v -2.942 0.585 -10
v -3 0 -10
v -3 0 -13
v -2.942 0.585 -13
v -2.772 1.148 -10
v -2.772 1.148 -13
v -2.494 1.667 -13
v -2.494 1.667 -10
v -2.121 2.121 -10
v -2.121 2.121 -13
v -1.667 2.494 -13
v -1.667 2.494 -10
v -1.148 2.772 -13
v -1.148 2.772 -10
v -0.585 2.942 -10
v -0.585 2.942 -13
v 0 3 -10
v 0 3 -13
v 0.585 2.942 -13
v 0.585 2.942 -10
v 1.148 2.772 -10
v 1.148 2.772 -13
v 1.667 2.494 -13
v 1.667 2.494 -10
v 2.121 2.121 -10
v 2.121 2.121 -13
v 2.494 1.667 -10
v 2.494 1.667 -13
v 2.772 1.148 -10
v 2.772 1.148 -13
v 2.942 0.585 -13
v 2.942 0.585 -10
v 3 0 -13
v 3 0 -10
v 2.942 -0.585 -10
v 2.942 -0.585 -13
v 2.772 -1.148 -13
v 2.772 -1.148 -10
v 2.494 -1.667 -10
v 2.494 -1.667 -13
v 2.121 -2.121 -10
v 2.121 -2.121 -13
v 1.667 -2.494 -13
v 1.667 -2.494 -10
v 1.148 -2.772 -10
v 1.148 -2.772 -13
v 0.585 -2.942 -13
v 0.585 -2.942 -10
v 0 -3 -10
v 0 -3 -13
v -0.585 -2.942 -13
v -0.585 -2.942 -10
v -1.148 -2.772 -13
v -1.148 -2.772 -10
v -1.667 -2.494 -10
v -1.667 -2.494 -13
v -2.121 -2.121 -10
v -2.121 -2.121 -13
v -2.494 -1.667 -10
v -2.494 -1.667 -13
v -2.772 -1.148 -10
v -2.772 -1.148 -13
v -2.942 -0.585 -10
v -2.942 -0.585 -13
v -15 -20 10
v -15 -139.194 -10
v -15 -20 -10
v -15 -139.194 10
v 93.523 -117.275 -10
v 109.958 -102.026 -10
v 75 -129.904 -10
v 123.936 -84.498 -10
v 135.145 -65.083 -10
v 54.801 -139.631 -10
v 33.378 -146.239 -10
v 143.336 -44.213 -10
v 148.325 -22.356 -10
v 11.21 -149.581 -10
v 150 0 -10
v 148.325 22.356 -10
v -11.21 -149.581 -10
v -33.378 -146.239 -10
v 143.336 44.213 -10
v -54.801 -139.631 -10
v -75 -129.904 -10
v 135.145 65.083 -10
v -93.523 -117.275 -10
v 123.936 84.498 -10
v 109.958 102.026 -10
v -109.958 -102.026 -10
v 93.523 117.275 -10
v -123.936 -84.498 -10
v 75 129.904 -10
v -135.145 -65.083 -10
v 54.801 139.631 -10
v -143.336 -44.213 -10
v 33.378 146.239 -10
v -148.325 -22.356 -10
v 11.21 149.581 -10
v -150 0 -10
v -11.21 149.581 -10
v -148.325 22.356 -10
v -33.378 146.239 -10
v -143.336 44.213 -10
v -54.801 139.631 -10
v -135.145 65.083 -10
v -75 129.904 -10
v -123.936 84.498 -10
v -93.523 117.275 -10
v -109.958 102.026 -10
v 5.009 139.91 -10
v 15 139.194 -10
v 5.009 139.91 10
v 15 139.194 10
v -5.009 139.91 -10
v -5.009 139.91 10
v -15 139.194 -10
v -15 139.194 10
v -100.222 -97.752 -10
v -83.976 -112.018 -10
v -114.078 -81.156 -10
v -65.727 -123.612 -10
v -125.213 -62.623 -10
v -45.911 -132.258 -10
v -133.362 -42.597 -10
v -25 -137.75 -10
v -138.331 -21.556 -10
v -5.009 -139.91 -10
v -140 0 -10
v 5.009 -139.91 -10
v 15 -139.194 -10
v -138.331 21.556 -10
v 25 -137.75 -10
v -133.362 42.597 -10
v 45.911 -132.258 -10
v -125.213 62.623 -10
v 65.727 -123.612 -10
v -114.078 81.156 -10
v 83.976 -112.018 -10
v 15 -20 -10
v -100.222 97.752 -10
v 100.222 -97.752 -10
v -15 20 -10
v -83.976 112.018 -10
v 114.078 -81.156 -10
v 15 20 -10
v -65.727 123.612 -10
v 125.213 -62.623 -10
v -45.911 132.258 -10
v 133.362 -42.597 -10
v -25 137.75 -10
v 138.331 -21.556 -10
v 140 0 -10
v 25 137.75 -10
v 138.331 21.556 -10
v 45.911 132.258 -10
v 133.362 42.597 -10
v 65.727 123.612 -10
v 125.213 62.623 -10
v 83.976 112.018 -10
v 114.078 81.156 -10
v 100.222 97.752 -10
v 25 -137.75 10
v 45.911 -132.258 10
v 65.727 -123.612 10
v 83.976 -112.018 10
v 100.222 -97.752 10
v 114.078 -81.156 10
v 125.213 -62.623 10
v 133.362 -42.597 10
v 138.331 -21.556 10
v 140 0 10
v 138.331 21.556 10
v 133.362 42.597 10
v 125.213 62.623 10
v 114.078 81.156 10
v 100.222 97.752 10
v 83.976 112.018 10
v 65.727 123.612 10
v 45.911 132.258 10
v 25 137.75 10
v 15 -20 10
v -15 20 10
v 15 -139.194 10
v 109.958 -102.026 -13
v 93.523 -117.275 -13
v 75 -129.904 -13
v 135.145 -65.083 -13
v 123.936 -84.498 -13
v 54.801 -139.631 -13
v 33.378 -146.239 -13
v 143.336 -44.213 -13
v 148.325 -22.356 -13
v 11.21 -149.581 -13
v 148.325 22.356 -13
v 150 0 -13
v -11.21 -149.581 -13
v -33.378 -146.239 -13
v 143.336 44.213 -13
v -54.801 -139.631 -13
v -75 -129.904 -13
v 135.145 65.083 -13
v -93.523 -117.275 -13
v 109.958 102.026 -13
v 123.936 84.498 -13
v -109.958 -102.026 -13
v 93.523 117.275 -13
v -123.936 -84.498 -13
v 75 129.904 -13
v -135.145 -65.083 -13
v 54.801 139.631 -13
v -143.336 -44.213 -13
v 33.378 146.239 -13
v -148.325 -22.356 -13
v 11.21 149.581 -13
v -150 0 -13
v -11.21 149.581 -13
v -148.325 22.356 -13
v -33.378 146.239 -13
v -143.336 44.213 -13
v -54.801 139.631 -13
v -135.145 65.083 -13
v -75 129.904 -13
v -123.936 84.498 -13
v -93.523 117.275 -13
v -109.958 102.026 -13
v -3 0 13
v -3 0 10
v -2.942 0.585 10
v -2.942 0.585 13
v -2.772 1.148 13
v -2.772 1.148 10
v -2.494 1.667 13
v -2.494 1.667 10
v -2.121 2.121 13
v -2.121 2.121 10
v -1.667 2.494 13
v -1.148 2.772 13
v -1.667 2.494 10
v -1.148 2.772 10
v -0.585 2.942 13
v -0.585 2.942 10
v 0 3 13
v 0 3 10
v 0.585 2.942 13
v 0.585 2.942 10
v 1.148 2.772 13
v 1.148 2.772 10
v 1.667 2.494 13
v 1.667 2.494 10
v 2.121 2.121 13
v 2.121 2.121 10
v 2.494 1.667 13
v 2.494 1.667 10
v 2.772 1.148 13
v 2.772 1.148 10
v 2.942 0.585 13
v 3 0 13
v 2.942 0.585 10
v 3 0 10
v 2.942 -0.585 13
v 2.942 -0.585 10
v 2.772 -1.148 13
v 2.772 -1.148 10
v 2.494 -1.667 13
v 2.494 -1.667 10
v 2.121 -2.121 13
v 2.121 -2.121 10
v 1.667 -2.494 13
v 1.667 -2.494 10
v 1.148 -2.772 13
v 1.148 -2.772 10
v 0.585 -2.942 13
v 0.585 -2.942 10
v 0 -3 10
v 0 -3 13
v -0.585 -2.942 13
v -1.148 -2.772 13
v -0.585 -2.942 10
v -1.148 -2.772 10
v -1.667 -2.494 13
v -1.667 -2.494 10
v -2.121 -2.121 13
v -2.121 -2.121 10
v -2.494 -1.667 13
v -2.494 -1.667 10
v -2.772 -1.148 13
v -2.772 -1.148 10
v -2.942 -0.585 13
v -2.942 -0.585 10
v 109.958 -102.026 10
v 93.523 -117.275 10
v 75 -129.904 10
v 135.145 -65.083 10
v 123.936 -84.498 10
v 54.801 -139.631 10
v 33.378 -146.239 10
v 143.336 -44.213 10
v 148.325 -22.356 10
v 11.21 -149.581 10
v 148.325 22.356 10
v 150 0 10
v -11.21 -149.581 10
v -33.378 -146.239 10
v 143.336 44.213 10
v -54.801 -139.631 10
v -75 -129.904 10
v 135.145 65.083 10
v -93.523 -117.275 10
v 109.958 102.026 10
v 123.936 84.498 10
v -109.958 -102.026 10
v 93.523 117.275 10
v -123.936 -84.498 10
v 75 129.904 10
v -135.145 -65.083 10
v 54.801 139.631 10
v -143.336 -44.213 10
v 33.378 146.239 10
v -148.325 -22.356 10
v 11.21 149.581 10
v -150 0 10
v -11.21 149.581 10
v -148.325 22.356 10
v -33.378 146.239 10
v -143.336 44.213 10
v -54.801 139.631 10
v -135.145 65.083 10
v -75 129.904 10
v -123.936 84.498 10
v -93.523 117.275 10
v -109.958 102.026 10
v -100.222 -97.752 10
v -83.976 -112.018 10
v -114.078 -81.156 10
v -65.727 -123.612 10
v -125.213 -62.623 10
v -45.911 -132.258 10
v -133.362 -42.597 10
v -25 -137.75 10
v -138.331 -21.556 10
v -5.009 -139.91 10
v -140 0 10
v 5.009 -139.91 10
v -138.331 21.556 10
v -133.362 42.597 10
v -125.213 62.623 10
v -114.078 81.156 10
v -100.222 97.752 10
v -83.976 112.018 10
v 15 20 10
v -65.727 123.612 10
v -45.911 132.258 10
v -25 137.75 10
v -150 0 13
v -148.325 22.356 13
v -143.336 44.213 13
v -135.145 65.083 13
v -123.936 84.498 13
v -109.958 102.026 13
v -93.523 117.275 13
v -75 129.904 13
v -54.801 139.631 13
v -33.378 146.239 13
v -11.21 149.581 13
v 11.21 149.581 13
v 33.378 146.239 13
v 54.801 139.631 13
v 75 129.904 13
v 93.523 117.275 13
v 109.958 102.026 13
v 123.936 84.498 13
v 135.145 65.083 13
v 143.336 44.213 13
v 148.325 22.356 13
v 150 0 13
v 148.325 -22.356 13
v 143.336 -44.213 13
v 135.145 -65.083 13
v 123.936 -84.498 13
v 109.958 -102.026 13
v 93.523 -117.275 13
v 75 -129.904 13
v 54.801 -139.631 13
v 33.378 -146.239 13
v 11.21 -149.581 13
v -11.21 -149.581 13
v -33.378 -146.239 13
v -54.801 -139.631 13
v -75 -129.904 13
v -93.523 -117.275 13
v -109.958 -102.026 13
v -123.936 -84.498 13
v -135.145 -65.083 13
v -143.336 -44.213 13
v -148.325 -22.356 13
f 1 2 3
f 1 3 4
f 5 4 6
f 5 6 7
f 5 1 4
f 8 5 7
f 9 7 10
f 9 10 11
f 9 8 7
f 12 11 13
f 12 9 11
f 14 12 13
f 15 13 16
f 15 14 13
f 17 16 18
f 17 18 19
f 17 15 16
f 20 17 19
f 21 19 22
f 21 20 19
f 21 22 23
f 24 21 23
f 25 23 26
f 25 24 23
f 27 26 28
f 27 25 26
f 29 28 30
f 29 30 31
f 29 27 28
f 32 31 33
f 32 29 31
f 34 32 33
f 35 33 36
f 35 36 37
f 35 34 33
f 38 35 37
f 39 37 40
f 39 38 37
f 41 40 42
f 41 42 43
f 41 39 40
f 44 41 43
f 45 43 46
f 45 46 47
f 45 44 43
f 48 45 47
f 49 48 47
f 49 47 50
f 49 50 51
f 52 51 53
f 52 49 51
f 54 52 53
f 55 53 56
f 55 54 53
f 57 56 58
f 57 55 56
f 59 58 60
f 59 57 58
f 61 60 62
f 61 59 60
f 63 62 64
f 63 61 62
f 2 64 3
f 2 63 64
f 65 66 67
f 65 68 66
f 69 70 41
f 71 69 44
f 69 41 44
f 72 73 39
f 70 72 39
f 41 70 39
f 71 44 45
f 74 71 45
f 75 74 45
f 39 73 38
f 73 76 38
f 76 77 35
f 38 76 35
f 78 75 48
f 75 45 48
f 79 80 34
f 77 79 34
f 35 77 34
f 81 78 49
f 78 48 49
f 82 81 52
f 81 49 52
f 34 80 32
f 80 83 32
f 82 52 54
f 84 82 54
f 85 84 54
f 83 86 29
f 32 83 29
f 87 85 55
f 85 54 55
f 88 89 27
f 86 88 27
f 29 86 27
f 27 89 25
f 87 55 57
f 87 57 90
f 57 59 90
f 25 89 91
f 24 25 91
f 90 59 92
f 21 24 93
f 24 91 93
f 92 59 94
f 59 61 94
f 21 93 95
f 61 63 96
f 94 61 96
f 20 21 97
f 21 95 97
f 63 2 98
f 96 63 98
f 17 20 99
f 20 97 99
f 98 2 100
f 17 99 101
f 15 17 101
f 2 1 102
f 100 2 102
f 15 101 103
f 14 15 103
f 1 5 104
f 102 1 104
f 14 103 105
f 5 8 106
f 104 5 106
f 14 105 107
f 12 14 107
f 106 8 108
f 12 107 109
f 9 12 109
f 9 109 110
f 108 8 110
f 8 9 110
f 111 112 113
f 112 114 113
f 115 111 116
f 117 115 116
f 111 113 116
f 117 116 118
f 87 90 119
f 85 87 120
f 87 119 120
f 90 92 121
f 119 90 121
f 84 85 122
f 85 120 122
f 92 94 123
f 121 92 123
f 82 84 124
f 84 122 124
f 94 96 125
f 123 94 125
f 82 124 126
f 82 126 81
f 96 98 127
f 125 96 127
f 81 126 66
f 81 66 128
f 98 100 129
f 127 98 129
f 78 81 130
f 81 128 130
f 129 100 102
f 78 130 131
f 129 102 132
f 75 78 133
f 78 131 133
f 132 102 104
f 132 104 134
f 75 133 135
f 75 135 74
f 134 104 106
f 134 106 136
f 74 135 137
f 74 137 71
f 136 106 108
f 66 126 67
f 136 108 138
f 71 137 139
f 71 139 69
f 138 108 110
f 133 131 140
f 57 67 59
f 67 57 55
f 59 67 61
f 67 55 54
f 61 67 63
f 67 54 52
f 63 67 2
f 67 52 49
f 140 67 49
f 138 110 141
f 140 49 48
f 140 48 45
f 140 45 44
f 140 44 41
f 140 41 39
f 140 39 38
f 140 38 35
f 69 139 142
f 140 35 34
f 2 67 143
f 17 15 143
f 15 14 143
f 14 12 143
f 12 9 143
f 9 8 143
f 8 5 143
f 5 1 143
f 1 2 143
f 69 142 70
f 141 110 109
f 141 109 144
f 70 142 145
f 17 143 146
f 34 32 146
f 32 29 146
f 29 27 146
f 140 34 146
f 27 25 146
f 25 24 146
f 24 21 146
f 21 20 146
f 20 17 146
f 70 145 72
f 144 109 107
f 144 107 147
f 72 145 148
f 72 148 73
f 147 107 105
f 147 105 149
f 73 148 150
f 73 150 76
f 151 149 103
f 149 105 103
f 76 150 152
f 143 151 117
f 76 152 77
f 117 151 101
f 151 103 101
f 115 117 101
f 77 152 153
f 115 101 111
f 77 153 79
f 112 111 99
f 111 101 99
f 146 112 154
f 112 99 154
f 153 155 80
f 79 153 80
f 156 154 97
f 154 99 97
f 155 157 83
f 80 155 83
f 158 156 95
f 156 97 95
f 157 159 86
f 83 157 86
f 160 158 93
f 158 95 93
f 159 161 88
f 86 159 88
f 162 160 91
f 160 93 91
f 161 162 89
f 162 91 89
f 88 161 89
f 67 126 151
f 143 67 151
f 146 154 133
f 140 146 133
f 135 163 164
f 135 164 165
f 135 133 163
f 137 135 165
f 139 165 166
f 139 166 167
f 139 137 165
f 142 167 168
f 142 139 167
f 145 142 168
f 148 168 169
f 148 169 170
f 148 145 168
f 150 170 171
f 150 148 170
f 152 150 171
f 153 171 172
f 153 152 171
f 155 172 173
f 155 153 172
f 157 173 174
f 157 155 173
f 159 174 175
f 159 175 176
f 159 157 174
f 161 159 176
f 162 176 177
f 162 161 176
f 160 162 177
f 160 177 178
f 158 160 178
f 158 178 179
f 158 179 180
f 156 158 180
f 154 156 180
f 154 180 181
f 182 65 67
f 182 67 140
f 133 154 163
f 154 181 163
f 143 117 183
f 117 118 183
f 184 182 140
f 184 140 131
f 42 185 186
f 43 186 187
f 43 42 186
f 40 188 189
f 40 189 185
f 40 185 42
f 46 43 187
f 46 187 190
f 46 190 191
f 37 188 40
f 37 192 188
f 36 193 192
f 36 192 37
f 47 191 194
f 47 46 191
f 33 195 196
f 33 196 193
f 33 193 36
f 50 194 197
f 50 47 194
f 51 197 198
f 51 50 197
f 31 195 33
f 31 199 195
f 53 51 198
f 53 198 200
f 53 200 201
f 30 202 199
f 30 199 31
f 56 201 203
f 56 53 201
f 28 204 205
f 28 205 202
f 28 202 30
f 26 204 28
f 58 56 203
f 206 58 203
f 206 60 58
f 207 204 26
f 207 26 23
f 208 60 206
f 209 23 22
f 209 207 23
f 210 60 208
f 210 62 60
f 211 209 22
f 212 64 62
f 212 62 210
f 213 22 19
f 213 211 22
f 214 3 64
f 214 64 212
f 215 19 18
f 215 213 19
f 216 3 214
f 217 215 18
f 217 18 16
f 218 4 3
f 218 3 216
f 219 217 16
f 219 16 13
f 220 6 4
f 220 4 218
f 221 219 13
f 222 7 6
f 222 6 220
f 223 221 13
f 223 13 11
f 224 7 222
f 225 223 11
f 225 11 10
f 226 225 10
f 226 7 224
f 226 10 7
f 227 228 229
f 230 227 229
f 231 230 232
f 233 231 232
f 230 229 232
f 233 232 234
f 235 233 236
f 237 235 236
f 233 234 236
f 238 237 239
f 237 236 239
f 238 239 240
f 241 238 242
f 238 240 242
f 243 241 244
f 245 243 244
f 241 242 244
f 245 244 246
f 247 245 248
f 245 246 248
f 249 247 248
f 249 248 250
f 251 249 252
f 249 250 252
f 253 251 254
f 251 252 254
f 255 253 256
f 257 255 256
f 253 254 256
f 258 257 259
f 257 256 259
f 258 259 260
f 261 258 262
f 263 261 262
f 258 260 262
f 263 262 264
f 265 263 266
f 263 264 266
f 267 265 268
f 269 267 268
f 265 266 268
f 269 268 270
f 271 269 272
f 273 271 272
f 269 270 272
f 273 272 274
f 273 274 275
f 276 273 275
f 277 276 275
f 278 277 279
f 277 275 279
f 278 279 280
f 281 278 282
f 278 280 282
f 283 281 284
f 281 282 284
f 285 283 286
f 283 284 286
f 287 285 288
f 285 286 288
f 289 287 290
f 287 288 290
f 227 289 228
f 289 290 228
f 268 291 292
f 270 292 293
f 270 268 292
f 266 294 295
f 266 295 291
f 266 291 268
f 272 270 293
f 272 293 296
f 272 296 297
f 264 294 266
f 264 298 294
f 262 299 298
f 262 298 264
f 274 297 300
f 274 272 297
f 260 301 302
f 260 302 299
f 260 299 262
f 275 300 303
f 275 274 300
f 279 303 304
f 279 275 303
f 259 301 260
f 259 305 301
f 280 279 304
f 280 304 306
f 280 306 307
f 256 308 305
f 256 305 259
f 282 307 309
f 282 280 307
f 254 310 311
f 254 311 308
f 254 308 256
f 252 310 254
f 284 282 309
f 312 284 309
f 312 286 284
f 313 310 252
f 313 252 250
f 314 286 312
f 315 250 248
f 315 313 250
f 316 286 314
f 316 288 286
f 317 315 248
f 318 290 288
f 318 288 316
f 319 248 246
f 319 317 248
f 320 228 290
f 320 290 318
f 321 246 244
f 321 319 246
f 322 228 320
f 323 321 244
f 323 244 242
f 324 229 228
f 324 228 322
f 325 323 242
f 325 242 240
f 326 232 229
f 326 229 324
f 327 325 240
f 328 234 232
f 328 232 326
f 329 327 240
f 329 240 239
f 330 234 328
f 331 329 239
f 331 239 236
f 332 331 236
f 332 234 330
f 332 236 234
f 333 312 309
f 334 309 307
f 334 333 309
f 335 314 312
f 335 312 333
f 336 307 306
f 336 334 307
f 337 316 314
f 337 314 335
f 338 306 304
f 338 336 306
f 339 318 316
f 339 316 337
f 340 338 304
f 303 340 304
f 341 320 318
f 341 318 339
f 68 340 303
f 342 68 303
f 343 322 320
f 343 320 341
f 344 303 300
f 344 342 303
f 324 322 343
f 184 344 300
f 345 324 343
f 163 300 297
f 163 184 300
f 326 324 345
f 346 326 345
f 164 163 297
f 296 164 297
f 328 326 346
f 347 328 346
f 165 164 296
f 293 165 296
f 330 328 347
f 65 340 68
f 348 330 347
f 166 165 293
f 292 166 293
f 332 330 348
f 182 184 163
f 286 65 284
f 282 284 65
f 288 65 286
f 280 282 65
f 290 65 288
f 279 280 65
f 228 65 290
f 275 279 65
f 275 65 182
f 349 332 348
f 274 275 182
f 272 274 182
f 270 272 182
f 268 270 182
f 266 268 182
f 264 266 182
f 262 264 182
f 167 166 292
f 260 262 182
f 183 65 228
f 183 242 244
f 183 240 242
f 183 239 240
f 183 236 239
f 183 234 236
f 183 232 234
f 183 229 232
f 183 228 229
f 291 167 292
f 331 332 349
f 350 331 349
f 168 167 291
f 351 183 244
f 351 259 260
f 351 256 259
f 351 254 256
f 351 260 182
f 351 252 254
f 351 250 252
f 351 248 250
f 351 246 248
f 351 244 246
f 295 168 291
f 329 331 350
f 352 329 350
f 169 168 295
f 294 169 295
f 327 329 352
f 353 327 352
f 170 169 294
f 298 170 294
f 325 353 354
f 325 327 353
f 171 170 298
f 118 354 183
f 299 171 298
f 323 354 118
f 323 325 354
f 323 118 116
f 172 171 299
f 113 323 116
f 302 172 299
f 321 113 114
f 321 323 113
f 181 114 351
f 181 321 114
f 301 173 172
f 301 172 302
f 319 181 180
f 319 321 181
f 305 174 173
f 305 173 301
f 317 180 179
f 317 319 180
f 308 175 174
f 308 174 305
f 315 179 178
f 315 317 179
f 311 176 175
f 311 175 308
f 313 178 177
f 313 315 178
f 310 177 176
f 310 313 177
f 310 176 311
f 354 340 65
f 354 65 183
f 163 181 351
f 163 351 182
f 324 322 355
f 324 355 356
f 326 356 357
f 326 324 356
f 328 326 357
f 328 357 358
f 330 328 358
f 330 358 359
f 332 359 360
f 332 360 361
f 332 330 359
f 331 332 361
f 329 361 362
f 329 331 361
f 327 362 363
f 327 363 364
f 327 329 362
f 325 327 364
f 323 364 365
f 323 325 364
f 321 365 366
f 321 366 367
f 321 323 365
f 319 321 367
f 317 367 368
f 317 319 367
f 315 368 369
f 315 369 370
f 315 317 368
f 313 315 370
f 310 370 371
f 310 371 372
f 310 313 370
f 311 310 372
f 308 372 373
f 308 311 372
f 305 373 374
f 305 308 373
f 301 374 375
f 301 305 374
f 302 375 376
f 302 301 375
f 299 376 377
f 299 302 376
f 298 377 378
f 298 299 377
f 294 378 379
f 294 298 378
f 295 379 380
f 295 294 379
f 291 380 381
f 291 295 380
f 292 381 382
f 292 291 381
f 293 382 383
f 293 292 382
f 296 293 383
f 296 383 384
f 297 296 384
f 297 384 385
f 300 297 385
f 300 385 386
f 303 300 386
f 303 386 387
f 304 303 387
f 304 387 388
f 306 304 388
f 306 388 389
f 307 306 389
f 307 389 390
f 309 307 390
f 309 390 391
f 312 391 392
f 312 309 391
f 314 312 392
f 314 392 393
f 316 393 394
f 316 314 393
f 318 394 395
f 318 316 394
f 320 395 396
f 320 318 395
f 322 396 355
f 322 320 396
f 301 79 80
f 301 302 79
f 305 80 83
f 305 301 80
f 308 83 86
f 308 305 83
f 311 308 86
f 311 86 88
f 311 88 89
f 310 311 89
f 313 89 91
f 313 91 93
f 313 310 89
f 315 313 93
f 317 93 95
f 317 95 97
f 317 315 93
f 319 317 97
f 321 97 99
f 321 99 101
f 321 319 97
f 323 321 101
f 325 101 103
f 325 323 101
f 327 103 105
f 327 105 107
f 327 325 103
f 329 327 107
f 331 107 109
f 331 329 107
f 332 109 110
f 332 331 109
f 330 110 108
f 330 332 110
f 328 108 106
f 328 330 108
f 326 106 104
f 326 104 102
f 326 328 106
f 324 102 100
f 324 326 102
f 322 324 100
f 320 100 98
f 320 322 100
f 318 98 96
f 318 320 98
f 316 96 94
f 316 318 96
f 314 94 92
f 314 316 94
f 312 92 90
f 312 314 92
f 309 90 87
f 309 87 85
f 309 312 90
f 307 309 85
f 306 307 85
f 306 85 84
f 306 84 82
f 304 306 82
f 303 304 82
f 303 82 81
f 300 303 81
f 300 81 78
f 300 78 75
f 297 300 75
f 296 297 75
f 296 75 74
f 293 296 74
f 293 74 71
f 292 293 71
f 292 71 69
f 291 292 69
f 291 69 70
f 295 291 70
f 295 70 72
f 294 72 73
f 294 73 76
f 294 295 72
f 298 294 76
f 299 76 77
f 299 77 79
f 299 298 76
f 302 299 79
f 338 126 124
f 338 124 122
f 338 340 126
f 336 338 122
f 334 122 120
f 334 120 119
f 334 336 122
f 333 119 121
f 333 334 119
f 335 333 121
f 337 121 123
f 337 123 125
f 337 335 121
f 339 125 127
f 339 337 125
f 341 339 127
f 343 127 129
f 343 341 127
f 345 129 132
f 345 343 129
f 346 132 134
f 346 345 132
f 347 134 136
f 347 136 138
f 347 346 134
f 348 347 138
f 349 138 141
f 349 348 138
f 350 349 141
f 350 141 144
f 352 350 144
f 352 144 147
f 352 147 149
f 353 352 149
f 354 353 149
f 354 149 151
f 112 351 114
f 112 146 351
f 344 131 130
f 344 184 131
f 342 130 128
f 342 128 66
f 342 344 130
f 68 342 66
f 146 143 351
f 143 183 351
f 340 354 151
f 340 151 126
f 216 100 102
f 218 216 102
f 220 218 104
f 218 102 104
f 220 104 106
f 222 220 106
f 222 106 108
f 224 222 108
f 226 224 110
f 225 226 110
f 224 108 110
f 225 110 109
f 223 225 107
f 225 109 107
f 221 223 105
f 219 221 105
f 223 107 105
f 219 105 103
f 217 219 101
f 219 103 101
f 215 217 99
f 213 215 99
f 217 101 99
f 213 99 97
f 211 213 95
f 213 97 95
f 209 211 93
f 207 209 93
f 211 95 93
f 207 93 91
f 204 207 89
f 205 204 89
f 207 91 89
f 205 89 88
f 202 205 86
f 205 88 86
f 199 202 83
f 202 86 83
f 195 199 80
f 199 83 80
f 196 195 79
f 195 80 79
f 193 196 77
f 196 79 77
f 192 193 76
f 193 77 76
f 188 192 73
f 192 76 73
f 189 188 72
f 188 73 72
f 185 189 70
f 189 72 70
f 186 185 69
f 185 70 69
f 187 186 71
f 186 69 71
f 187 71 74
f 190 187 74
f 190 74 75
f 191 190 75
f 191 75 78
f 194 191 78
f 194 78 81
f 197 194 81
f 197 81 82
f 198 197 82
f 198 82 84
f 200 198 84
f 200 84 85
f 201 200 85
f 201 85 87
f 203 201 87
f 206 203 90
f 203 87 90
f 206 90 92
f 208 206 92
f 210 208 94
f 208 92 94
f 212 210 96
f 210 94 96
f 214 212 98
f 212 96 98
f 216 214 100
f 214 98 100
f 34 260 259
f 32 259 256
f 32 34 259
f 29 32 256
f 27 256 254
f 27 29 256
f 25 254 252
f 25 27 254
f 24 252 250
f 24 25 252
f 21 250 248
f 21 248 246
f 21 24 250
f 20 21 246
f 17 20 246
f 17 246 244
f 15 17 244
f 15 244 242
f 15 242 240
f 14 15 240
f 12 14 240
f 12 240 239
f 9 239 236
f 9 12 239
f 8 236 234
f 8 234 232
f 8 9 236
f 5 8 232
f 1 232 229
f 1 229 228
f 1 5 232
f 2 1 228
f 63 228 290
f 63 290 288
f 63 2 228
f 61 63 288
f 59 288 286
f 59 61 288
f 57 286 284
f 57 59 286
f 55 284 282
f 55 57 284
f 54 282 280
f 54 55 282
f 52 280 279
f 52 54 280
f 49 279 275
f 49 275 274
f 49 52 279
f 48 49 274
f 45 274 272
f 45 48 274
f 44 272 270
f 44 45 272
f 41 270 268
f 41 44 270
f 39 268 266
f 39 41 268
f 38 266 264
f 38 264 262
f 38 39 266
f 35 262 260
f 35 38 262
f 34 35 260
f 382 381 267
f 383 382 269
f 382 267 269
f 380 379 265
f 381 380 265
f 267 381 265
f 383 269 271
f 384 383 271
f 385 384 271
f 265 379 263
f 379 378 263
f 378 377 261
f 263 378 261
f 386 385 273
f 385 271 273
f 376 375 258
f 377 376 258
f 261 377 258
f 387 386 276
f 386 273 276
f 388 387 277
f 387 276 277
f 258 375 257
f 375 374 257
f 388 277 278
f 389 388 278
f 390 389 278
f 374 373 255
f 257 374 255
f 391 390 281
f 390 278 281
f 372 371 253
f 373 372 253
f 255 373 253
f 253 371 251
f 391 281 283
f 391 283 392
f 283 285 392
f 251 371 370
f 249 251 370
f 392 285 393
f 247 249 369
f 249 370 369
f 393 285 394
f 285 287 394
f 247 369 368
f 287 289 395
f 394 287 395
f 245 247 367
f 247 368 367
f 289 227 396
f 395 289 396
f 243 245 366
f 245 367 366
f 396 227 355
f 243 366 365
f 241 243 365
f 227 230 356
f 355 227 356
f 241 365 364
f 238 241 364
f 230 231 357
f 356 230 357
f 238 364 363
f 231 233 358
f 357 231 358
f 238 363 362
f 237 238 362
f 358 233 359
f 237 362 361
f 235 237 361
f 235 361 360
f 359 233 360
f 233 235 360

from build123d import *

# Parameters (mm, degrees)
ESQUISSE1_R        = 150
ESQUISSE1_R_2      = 3
BOSS_EXTRU_1_DEPTH = 10
ESQUISSE2_R        = 150
ESQUISSE2_R_2      = 3
BOSS_EXTRU_2_DEPTH = 3


with BuildPart() as part:
    # Esquisse1 → Boss.-Extru.1 (new, symmetric)
    with BuildSketch(Plane.XY):
        Circle(ESQUISSE1_R)
        Circle(ESQUISSE1_R_2, mode=Mode.SUBTRACT)
        with BuildLine():
            Line((-25, 137.74977314), (-25, -137.74977314))
            ThreePointArc((-25, -137.74977314), (-140, 0), (-25, 137.74977314))
        make_face(mode=Mode.SUBTRACT)
        with BuildLine():
            Line((-15, 139.194109071), (-15, 20))
            Line((-15, 20), (15, 20))
            Line((15, 20), (15, 139.194109071))
            ThreePointArc((15, 139.194109071), (0, 140), (-15, 139.194109071))
        make_face(mode=Mode.SUBTRACT)
        with BuildLine():
            Line((-15, -20), (15, -20))
            Line((15, -20), (15, -139.194109071))
            ThreePointArc((15, -139.194109071), (0, -140), (-15, -139.194109071))
            Line((-15, -139.194109071), (-15, -20))
        make_face(mode=Mode.SUBTRACT)
        with BuildLine():
            Line((25, 137.74977314), (25, -137.74977314))
            ThreePointArc((25, -137.74977314), (140, 0), (25, 137.74977314))
        make_face(mode=Mode.SUBTRACT)
    extrude(amount=BOSS_EXTRU_1_DEPTH, both=True)


with BuildPart() as body_2:
    # Esquisse2 → Boss.-Extru.2 (new body)
    with BuildSketch(Plane(origin=(0, 0, -10), x_dir=(-1, 0, 0), z_dir=(0, 0, -1))):
        Circle(ESQUISSE2_R)
        Circle(ESQUISSE2_R_2, mode=Mode.SUBTRACT)
    extrude(amount=BOSS_EXTRU_2_DEPTH)


with BuildPart() as body_3:
    # Symétrie1: mirrored copy
    add(body_2.part.mirror(Plane.XY))


solid = Compound([part.part, body_2.part, body_3.part])
